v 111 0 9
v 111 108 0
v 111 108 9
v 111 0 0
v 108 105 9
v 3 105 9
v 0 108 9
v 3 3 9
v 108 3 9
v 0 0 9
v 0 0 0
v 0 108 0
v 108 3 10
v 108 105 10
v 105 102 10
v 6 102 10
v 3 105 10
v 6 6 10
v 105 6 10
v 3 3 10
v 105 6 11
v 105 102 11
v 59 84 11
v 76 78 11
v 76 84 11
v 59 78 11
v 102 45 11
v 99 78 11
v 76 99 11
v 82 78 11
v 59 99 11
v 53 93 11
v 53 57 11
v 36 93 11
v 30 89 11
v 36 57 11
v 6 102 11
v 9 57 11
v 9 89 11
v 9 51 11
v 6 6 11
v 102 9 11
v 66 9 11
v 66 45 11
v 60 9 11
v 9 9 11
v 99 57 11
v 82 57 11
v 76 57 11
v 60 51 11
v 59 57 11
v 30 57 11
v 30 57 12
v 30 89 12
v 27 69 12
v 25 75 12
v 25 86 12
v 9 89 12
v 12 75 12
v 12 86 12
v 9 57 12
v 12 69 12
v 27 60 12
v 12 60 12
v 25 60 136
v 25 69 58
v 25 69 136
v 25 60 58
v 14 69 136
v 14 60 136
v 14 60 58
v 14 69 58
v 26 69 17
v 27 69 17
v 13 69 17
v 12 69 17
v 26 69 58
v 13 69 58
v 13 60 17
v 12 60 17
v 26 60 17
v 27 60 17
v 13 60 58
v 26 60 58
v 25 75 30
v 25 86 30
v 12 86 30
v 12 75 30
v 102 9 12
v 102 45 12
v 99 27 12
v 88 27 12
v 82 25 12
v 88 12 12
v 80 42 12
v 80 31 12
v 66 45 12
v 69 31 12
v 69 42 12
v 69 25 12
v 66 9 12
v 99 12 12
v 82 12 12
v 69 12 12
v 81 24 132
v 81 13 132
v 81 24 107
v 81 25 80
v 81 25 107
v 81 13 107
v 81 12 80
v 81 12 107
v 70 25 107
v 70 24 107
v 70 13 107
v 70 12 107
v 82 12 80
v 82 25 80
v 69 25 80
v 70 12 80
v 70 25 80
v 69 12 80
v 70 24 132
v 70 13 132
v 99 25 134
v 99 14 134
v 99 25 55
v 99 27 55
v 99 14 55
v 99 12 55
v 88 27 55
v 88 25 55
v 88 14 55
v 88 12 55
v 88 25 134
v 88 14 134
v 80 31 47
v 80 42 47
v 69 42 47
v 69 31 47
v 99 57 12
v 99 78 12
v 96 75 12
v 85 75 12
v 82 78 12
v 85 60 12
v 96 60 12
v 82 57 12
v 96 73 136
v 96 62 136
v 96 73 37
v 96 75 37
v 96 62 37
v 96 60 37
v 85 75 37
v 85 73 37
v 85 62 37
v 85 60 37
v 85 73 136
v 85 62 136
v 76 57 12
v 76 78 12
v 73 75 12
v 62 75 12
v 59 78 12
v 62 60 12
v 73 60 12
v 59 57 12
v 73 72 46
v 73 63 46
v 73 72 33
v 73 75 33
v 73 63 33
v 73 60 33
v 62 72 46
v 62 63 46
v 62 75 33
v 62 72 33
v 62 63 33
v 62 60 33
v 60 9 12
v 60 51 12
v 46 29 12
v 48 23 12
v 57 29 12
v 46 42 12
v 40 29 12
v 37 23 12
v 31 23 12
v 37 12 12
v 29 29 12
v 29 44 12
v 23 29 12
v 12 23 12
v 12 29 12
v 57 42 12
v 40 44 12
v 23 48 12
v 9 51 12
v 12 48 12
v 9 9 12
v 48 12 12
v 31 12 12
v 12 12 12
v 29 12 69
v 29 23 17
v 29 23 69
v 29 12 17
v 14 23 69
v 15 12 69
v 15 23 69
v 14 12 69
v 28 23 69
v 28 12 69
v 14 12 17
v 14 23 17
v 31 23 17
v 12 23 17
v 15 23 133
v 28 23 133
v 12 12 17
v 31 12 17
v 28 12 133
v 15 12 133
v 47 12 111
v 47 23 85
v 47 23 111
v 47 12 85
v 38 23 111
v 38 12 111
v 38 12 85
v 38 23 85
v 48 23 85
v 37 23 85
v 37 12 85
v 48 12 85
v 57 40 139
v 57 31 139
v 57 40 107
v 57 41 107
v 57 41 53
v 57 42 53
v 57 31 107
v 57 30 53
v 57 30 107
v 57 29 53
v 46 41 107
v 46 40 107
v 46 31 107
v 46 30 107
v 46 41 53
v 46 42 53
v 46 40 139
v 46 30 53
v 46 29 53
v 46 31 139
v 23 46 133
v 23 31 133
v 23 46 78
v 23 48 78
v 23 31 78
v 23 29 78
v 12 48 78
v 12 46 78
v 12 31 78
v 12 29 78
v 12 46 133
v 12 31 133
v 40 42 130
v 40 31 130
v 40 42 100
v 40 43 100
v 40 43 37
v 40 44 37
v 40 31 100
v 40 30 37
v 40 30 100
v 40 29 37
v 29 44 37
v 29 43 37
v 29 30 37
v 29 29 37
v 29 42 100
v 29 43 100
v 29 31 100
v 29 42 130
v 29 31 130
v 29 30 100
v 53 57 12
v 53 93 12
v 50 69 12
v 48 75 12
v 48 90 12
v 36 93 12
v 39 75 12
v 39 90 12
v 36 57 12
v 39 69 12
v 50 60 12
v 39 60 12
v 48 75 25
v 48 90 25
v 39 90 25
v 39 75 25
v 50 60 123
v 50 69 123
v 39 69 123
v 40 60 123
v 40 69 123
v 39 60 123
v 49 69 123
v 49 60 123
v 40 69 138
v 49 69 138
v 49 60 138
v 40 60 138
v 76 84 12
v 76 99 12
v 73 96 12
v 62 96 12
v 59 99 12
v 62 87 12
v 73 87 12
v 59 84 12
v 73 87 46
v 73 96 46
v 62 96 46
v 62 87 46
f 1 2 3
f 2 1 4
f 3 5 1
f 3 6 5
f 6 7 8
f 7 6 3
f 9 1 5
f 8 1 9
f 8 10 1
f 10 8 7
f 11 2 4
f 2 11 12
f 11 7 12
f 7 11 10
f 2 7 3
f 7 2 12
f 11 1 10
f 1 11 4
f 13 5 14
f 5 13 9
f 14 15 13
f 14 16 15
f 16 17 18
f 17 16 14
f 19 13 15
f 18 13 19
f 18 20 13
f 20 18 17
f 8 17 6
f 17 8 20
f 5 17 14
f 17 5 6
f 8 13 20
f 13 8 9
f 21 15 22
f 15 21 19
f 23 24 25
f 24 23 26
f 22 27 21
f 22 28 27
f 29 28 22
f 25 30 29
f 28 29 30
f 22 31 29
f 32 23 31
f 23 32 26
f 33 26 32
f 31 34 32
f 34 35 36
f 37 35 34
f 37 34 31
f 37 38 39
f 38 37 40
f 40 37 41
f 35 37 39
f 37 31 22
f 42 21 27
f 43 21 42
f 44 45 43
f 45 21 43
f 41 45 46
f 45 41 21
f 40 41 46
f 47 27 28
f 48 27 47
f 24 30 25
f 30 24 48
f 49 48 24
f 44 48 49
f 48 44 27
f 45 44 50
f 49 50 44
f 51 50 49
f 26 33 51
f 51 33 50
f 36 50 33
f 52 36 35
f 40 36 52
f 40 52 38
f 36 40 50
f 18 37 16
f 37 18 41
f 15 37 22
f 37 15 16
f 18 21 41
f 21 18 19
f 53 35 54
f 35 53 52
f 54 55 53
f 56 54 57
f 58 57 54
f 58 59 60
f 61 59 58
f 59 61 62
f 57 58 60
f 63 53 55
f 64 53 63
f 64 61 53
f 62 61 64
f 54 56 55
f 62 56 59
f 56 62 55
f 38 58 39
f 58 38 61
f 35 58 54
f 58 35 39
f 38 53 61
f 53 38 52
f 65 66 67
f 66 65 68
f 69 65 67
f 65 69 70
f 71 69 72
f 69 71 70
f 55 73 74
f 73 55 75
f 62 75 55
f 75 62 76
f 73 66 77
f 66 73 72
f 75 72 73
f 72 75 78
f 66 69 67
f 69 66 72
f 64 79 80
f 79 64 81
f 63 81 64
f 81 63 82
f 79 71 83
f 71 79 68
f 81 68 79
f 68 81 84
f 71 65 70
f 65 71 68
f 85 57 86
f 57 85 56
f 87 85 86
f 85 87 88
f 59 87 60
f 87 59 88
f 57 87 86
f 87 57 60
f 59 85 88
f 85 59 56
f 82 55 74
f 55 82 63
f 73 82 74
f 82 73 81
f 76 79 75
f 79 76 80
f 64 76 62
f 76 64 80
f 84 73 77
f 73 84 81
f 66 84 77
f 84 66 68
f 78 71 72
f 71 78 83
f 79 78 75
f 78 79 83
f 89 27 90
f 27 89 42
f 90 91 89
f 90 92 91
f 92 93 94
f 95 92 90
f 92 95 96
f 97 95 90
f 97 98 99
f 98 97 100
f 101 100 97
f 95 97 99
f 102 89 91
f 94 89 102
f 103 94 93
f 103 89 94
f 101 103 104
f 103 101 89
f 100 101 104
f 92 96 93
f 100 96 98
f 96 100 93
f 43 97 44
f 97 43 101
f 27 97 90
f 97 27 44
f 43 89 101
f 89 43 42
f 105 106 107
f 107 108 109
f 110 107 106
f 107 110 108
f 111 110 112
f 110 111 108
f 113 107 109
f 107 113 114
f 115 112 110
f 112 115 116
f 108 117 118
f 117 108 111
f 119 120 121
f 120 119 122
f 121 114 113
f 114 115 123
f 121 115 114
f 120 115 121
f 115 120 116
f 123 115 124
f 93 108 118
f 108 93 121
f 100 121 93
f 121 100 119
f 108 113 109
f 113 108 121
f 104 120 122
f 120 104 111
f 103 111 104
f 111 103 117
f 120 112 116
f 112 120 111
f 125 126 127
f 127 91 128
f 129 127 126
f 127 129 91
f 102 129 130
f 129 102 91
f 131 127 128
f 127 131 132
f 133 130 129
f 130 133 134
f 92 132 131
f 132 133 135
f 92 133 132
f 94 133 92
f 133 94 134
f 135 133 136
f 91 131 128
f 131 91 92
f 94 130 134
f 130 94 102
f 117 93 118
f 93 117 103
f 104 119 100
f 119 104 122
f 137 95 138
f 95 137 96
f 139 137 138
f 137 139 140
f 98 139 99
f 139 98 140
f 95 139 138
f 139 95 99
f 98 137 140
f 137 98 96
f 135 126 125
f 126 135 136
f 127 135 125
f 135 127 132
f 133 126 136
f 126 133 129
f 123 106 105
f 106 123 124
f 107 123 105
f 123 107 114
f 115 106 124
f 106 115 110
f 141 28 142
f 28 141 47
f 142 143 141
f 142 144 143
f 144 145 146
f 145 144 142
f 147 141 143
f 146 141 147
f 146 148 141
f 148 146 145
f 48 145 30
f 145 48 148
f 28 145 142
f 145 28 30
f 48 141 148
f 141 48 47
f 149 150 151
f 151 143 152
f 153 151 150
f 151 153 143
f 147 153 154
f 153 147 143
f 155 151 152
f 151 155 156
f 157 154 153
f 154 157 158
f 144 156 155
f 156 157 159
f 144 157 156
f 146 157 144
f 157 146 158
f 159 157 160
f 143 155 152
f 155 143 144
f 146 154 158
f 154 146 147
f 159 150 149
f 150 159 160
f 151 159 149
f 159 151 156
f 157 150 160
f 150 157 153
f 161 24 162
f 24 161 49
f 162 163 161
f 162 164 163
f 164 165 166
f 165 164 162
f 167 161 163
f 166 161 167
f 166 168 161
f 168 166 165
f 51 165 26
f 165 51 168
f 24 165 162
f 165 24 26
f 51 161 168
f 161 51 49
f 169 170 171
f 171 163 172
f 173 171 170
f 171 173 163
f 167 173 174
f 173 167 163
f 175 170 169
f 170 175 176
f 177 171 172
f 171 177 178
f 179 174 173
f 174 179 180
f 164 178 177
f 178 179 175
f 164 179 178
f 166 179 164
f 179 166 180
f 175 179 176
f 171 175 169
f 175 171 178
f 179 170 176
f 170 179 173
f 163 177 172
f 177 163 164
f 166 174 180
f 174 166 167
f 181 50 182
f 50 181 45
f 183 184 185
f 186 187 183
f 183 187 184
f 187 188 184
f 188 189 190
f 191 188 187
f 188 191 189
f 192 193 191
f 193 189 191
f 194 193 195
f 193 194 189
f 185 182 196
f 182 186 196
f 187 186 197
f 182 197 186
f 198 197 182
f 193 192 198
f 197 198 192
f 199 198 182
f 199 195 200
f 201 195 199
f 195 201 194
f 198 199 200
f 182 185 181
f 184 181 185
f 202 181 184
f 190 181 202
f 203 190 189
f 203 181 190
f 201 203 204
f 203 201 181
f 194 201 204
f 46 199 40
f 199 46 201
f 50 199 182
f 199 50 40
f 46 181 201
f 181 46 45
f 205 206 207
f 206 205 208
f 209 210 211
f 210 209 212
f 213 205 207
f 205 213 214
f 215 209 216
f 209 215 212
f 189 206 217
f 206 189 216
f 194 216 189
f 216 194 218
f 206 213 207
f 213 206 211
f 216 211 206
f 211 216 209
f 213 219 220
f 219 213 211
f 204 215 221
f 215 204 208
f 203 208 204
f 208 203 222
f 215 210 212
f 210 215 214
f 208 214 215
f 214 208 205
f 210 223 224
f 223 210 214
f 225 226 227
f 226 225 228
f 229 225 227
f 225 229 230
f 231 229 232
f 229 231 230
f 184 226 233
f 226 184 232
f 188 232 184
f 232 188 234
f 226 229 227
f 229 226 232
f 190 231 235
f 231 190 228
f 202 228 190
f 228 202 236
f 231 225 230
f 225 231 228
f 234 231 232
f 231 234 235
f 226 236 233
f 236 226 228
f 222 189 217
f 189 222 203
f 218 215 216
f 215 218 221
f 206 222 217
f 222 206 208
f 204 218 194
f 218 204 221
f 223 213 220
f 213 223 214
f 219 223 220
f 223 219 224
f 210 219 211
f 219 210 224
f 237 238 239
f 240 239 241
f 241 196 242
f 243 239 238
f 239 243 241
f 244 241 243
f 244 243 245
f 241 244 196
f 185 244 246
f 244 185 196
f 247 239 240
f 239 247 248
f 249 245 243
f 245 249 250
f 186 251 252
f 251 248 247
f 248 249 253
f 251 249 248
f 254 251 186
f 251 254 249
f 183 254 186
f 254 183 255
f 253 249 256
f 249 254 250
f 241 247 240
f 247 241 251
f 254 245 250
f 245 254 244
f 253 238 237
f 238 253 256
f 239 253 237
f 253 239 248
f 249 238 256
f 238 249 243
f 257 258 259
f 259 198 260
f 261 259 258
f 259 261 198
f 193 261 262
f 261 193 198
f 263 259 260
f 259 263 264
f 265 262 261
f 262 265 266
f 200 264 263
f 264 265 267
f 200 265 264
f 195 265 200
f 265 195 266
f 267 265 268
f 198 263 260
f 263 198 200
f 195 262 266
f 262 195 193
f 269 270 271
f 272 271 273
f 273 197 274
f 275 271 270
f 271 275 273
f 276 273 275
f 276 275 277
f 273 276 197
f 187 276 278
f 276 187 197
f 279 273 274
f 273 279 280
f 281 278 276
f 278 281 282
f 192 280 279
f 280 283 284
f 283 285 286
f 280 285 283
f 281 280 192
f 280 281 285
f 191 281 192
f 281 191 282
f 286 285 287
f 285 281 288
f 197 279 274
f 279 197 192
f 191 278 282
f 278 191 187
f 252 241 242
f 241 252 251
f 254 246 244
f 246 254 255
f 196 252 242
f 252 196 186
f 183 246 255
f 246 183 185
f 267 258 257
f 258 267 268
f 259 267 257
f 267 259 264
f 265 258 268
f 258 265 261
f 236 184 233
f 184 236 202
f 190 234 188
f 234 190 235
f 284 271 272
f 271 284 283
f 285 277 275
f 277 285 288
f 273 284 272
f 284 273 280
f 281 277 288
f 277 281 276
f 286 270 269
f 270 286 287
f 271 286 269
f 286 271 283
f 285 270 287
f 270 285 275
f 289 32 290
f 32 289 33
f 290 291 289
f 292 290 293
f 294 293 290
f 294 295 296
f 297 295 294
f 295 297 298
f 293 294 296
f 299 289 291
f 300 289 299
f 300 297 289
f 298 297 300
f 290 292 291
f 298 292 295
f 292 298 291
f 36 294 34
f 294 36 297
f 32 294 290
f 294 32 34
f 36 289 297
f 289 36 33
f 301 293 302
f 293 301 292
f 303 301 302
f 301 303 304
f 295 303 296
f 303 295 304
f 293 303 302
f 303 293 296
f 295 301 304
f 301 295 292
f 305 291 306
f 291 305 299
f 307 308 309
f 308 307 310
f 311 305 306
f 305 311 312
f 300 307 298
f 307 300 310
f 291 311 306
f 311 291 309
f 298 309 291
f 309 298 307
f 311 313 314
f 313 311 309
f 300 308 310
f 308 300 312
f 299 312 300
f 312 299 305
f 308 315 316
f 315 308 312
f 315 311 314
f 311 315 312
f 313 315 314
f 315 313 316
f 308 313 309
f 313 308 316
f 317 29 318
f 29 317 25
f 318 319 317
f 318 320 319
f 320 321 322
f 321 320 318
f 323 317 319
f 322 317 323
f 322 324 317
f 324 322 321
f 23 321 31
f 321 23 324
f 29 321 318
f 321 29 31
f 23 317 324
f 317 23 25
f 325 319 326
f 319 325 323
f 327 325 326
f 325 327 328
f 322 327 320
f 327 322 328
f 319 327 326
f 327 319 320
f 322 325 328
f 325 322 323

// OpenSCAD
rotate([0,0,0]){translate([0,0,0]){cube([111,108,9]);}
translate([3,3,1]){cube([105,102,9]);}
translate([6,6,2]){cube([99,96,9]);}
translate([9,57,3]){cube([21,32,9]);}
translate([14,60,123]){cube([11,9,13]);}
translate([14,60,110]){cube([11,9,13]);}
translate([12,75,17]){cube([13,11,13]);}
translate([12,60,4]){cube([15,9,13]);}
translate([14,60,97]){cube([11,9,13]);}
translate([12,75,4]){cube([13,11,13]);}
translate([13,60,45]){cube([13,9,13]);}
translate([13,60,32]){cube([13,9,13]);}
translate([14,60,84]){cube([11,9,13]);}
translate([14,60,71]){cube([11,9,13]);}
translate([14,60,58]){cube([11,9,13]);}
translate([13,60,17]){cube([13,9,15]);}
translate([66,9,3]){cube([36,36,9]);}
translate([70,12,80]){cube([11,13,27]);}
translate([88,12,4]){cube([11,15,51]);}
translate([69,12,61]){cube([13,13,19]);}
translate([69,12,42]){cube([13,13,19]);}
translate([69,12,23]){cube([13,13,19]);}
translate([69,12,4]){cube([13,13,19]);}
translate([69,31,4]){cube([11,11,43]);}
translate([88,14,107]){cube([11,11,27]);}
translate([88,14,78]){cube([11,11,29]);}
translate([88,14,55]){cube([11,11,23]);}
translate([70,13,107]){cube([11,11,25]);}
translate([82,57,3]){cube([17,21,9]);}
translate([85,60,4]){cube([11,15,33]);}
translate([85,62,117]){cube([11,11,19]);}
translate([85,62,98]){cube([11,11,19]);}
translate([85,62,37]){cube([11,11,61]);}
translate([59,57,3]){cube([17,21,9]);}
translate([62,63,33]){cube([11,9,13]);}
translate([62,60,4]){cube([11,15,29]);}
translate([9,9,3]){cube([51,42,9]);}
translate([14,12,56]){cube([15,11,13]);}
translate([38,12,98]){cube([9,11,13]);}
translate([14,12,43]){cube([15,11,13]);}
translate([14,12,30]){cube([15,11,13]);}
translate([38,12,85]){cube([9,11,13]);}
translate([12,12,4]){cube([19,11,13]);}
translate([14,12,17]){cube([15,11,13]);}
translate([15,12,120]){cube([13,11,13]);}
translate([46,30,94]){cube([11,11,13]);}
translate([46,30,81]){cube([11,11,13]);}
translate([46,30,68]){cube([11,11,13]);}
translate([46,31,124]){cube([11,9,15]);}
translate([12,29,47]){cube([11,19,31]);}
translate([12,29,4]){cube([11,19,43]);}
translate([29,29,4]){cube([11,15,33]);}
translate([46,29,4]){cube([11,13,49]);}
translate([12,31,78]){cube([11,15,55]);}
translate([37,12,4]){cube([11,11,81]);}
translate([29,30,77]){cube([11,13,23]);}
translate([46,30,53]){cube([11,11,15]);}
translate([29,31,113]){cube([11,11,17]);}
translate([46,31,107]){cube([11,9,17]);}
translate([29,30,58]){cube([11,13,19]);}
translate([29,30,37]){cube([11,13,21]);}
translate([29,31,100]){cube([11,11,13]);}
translate([15,12,69]){cube([13,11,51]);}
translate([36,57,3]){cube([17,36,9]);}
translate([39,75,4]){cube([9,15,21]);}
translate([39,60,88]){cube([11,9,35]);}
translate([39,60,67]){cube([11,9,21]);}
translate([40,60,123]){cube([9,9,15]);}
translate([39,60,4]){cube([11,9,63]);}
translate([59,84,3]){cube([17,15,9]);}
translate([62,87,29]){cube([11,9,17]);}
translate([62,87,4]){cube([11,9,25]);}
}
